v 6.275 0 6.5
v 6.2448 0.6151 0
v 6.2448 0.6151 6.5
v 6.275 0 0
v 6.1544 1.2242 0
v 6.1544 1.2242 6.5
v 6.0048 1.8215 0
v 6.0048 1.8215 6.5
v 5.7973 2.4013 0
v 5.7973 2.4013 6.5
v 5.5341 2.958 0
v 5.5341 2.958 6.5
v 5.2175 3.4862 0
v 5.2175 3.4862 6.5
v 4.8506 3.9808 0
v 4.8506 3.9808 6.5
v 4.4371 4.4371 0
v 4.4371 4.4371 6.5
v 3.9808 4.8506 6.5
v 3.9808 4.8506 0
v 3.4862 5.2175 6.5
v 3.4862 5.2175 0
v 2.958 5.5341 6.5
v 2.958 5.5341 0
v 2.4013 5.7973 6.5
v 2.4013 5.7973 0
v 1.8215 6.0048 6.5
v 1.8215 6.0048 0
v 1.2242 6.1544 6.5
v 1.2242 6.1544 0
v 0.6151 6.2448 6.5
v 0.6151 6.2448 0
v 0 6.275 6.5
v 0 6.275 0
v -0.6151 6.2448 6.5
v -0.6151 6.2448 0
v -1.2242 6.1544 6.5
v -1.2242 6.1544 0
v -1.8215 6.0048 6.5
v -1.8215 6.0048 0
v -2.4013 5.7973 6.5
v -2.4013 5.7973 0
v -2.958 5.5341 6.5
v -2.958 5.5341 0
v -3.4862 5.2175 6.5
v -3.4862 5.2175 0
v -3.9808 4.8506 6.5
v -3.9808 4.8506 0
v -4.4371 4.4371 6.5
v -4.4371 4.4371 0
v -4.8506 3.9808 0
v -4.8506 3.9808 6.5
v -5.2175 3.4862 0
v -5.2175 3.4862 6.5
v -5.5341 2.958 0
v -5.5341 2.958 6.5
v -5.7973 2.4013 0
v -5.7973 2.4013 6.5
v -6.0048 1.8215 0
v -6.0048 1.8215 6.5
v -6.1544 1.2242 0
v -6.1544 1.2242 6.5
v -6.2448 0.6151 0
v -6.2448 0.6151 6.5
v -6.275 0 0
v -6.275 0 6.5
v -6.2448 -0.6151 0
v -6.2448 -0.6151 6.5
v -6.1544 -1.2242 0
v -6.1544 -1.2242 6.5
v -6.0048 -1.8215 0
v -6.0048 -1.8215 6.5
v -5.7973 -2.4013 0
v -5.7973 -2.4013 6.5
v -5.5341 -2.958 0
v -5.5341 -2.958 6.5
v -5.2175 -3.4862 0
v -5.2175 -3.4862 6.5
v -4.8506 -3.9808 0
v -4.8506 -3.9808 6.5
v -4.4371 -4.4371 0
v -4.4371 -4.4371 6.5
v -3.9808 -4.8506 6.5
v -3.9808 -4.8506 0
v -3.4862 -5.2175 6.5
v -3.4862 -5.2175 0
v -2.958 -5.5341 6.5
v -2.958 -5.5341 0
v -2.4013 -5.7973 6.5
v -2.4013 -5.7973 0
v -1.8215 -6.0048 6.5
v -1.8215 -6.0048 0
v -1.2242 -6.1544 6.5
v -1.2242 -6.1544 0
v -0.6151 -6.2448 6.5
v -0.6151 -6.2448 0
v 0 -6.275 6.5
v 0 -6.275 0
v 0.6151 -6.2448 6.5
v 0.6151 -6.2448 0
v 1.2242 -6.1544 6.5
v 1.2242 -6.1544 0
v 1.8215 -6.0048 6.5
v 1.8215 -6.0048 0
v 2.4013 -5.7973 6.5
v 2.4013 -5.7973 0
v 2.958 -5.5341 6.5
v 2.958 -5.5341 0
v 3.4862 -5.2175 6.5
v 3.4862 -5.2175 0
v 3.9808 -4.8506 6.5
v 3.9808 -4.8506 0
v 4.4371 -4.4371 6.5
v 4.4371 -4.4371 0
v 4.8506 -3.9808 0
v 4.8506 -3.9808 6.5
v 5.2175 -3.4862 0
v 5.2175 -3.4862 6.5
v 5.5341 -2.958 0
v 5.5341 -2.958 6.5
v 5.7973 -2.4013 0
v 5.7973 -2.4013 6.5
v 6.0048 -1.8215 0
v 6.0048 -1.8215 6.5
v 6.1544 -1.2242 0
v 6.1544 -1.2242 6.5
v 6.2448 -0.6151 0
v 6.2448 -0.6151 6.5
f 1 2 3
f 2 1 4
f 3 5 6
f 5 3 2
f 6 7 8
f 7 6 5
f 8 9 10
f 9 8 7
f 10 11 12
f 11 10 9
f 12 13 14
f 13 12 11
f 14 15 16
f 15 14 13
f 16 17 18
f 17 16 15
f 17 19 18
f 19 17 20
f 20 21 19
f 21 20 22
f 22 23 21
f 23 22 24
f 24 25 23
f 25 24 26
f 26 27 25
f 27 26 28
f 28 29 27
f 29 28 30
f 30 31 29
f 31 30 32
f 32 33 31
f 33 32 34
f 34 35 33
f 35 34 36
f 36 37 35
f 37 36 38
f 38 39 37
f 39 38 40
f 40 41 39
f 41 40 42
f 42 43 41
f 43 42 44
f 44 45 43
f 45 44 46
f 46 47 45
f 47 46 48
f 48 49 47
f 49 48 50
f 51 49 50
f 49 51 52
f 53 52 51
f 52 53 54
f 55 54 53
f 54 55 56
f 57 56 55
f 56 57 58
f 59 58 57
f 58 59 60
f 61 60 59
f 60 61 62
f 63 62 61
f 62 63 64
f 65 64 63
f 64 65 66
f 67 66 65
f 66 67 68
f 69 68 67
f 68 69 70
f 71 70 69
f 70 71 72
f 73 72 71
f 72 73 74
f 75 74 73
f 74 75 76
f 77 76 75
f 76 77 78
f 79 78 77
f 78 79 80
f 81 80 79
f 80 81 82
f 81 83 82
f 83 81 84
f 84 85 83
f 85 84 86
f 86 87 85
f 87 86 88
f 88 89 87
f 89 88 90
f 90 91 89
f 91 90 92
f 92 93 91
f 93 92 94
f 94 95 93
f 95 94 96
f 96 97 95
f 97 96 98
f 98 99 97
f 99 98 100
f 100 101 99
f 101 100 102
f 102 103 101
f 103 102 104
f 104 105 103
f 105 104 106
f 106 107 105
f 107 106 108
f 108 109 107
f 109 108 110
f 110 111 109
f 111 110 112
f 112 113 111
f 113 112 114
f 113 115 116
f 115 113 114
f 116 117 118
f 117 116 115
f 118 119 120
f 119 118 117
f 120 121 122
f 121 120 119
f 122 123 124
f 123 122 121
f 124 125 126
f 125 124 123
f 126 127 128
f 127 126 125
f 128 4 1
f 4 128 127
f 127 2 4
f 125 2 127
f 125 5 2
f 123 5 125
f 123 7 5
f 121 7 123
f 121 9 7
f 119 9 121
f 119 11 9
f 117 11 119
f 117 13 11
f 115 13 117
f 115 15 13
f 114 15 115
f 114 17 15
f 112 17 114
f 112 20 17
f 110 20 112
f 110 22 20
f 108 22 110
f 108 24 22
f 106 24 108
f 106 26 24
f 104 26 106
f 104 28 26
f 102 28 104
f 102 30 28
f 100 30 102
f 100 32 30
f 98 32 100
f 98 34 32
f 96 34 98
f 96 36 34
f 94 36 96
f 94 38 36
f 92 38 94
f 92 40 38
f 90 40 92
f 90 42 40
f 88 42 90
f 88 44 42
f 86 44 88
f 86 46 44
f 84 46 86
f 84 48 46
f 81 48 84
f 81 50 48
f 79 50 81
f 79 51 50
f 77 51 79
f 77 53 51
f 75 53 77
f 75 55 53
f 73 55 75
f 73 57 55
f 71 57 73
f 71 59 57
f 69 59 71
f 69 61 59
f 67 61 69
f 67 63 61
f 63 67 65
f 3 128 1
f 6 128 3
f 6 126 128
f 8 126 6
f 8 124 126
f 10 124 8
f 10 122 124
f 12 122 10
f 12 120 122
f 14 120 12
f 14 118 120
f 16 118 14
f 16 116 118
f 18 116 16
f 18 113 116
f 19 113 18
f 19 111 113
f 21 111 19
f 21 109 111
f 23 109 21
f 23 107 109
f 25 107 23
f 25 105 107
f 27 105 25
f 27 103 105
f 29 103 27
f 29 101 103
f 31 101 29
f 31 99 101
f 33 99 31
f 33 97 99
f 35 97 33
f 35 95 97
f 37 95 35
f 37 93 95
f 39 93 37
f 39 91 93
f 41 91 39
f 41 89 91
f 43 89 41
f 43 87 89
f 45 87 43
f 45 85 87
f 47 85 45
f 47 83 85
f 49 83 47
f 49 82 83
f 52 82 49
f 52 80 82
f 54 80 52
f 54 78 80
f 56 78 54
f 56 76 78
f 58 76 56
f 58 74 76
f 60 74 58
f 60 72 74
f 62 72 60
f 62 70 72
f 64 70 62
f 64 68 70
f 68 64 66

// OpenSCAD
$fn = 64;
diameter = 12.55;
length = 6.5;
amount = 1;


module baseplug(){
    cylinder( length, diameter/2, diameter/2);
}

for( i = [ 0: amount-1]){
    translate([i*diameter, i*diameter, 0]){
        baseplug();
    }
}
